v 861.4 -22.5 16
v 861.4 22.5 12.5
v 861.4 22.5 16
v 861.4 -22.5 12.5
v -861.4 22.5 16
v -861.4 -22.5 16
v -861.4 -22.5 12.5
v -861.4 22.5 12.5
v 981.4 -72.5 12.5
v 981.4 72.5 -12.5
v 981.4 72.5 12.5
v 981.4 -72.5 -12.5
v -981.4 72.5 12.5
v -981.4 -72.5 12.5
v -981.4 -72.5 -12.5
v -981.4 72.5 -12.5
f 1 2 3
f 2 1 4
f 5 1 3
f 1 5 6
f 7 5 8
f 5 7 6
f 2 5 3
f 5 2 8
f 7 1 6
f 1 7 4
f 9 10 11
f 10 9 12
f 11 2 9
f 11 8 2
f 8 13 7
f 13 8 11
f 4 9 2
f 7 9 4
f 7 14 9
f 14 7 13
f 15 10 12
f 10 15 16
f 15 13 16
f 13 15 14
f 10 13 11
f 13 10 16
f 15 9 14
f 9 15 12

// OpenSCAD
// ====================================================================================
// REVOLUTIONARY TECHNOLOGY COMPANY & UNIVERSITY OF WASHINGTON DEPARTMENT OF PHYSICS
// Subsystem: silverado_md_emblems.scad (2027 Silverado HD Commercial Trim Matrix)
// Core Application: Stamped Billet Emblems and Modular Grille Cross-Bar Panels
// Center Origin (0,0,0) = Geometric Centerpoint of the Front Grille Cross-Bar Face
// ====================================================================================

$fn = 100; // High-precision tooling path and stamping profile resolution

// --- Fleet Trim Configurator ---
// 1 = High Country HD (Chrome Script), 2 = ZR2 Bison (Matte Black Block CHEVROLET), 3 = Work Truck (Debossed Polymer)
FLEET_TRIM_SELECTOR = 2;

// --- Physical Dimensional Constants (mm) ---
inch_to_mm         = 25.4;
grille_bar_width   = 82.0 * inch_to_mm;  // Spans the full front clip width natively [INDEX]
grille_bar_height  = 145.00;             // Vertical height matching the main split-bar trim
lettering_depth    = 8.00;               // Thick billet stamping profile relief

module multi_trim_grille_crossbar() {
    echo(str("COMPILING SILVERADO MD FASCIA ACCENTS TRIM INDEX: ", 
        (FLEET_TRIM_SELECTOR == 1) ? "HIGH_COUNTRY_CHROME_SCRIPT" : 
        (FLEET_TRIM_SELECTOR == 2) ? "ZR2_BISON_MATTE_BLOCK" : "WORK_TRUCK_POLYMER_BASE"));
        
    // Central horizontal split-bar trim panel wrapping the front clip grid [INDEX]
    color((FLEET_TRIM_SELECTOR == 1) ? "Silver" : 
          (FLEET_TRIM_SELECTOR == 2) ? "DarkCharcoal" : "Black") {
        difference() {
            // Main horizontal trim bar raw block
            cube([grille_bar_width - 120, grille_bar_height, 25.0], center=true);
            
            // Integrated debossed block lettering channels cut directly into the polymer face if WT spec
            if (FLEET_TRIM_SELECTOR == 3) {
                translate([0, 0, 10])
                    cube([grille_bar_width - 400, grille_bar_height - 40, lettering_depth], center=true);
            }
        }
    }
}

module stamped_chevrolet_block_letters() {
    // Recreates the bold stamped block lettering fixed across the grille center plane
    if (FLEET_TRIM_SELECTOR == 2) {
        color("Black") { // Low-glare matte black tactical finish
            translate([0, 0, 14]) {
                // Central horizontal structural core stringer linking the block lettering faces
                cube([grille_bar_width - 360, 45.0, 4.0], center=true);
                
                // Parametric Lettering Anchor Tabs (Mates with backing mesh slots) [INDEX]
                for (x = [-grille_bar_width/4 : 120 : grille_bar_width/4]) {
                    translate([x, 0, -6])
                        cylinder(d=6.5, h=12, center=true);
                }
            }
        }
    }
}

module premium_high_country_scripts() {
    // Models the intricate High Country door script and backing plates [INDEX]
    if (FLEET_TRIM_SELECTOR == 1) {
        color("Gold") { // Polished bronze/gold accent trim configurations
            translate([0, 0, 15]) {
                difference() {
                    cube([450.0, 55.0, 8.0], center=true);
                    translate([0, 0, -2]) cube([440.0, 45.0, 8.0], center=true); // Script silhouette relief
                }
            }
        }
    }
}

// --- Composite Front Trim Instantiation ---
union() {
    multi_trim_grille_crossbar();
    stamped_chevrolet_block_letters();
    premium_high_country_scripts();
}
